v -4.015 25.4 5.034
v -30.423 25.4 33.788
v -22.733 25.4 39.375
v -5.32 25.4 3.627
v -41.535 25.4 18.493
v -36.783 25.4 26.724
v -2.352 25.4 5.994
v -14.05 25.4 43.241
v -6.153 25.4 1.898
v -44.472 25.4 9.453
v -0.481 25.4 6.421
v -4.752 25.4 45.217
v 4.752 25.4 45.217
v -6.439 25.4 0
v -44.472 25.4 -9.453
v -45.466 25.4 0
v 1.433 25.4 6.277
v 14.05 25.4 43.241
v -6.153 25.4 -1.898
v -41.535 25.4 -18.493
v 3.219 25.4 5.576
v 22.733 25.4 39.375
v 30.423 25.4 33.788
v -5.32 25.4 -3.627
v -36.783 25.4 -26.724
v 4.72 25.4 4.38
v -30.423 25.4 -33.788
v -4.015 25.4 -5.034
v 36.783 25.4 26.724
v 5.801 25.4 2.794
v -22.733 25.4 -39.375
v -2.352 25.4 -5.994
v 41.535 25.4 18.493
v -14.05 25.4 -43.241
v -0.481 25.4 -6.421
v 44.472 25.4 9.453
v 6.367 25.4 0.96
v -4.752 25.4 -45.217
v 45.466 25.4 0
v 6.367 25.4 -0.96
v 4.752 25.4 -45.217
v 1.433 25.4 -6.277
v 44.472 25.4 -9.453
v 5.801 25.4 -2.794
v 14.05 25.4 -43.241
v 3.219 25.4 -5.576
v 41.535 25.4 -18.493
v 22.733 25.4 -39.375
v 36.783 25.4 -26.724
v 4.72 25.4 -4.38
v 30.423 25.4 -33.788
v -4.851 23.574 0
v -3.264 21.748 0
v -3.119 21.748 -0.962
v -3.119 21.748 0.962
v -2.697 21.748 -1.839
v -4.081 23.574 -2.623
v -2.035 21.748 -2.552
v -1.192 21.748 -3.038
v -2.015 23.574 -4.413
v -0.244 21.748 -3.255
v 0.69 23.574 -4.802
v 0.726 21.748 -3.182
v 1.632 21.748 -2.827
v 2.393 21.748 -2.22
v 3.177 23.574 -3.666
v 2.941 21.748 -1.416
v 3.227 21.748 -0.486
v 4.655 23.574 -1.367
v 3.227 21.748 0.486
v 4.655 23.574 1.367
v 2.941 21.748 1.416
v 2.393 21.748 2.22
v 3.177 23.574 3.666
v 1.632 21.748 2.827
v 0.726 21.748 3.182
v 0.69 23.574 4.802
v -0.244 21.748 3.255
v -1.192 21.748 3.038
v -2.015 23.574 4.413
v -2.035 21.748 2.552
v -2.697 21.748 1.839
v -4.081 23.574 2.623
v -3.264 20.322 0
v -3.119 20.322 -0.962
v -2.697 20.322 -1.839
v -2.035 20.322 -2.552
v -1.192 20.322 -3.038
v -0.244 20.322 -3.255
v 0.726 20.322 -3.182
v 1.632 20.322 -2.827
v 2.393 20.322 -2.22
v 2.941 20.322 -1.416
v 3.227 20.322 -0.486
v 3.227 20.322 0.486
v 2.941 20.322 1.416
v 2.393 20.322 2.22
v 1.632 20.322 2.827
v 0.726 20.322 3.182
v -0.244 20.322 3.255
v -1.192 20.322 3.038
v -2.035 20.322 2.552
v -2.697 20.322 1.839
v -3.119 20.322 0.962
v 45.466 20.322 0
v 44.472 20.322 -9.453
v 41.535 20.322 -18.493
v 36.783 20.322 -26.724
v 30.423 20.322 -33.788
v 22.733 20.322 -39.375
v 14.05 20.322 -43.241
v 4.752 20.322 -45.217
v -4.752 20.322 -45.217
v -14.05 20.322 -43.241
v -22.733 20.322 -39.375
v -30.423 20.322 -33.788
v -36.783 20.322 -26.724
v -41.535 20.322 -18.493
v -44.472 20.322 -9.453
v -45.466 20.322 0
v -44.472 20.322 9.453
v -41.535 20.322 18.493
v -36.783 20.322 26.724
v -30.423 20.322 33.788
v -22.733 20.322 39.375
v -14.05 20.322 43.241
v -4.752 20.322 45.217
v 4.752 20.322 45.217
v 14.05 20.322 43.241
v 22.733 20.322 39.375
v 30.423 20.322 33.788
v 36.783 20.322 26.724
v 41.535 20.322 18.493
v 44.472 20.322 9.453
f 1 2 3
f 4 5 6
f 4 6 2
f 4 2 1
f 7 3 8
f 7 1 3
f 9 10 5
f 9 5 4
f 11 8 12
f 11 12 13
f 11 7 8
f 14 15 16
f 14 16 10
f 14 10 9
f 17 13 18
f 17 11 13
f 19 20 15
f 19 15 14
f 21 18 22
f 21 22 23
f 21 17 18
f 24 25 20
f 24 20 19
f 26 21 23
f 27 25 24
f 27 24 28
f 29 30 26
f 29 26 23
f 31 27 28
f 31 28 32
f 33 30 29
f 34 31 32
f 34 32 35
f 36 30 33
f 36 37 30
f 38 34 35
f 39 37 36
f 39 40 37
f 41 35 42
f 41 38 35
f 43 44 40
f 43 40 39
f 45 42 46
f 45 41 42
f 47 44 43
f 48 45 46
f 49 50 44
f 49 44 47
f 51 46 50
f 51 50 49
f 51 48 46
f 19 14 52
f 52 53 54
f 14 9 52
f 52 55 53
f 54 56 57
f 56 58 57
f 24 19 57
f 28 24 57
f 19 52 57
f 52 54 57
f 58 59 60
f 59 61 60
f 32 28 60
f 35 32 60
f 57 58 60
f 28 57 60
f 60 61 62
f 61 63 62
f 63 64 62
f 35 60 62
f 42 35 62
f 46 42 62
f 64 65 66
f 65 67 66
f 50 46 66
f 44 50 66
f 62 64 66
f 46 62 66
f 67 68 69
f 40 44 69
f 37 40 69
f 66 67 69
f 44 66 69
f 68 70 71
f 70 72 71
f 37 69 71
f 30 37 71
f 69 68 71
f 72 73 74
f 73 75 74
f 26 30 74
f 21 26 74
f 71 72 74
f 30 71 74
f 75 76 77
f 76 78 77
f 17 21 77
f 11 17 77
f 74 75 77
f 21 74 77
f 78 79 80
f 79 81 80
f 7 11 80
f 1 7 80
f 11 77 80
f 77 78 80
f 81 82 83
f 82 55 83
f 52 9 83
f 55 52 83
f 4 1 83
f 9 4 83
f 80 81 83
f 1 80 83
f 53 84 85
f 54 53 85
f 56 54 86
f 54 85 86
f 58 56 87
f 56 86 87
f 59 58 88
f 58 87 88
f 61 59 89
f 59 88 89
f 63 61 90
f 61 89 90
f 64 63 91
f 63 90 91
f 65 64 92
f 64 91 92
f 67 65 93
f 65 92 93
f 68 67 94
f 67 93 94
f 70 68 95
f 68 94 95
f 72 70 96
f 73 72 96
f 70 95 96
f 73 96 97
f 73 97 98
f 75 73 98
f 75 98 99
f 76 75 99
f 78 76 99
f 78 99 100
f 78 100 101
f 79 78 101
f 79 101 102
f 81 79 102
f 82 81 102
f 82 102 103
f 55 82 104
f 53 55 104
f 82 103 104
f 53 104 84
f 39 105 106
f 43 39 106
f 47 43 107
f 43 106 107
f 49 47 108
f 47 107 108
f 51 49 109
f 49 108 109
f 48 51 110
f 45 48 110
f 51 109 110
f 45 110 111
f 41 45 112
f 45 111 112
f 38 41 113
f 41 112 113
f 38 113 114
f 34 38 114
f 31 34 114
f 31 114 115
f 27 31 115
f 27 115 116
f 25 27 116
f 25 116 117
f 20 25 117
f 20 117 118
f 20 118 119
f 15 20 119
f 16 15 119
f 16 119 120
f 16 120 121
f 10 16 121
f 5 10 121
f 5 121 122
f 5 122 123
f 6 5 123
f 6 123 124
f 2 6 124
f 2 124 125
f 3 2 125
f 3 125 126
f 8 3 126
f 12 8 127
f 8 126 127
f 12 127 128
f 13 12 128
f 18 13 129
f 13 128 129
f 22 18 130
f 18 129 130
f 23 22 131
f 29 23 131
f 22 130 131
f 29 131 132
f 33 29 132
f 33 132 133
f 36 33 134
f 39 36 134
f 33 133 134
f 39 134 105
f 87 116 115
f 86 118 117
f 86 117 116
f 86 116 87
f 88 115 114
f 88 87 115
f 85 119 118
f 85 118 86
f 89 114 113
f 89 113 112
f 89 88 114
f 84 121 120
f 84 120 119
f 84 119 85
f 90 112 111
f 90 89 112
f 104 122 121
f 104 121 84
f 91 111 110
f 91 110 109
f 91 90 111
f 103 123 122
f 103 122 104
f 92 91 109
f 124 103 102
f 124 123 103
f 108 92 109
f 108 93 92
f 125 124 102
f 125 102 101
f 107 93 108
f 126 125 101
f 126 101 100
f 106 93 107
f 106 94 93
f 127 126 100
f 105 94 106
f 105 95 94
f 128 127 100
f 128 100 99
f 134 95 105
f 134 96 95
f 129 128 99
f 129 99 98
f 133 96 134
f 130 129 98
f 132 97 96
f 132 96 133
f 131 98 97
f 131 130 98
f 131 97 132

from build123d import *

# Parameters (mm, degrees)
SKETCH1_R                                        = 45.466
BOSS_EXTRUDE1_DEPTH                              = 25.4
SKETCH3_R                                        = 20.32
CUT_EXTRUDE1_DEPTH                               = 12.7
CSK_FOR_1_4_FLAT_HEAD_MACHINE_SCREW1_D           = 6.5278
CSK_FOR_1_4_FLAT_HEAD_MACHINE_SCREW1_DEPTH       = 25.4
CSK_FOR_1_4_FLAT_HEAD_MACHINE_SCREW1_CSINK_D     = 12.8778
CSK_FOR_1_4_FLAT_HEAD_MACHINE_SCREW1_CSINK_ANGLE = 82
CSK_FOR_1_4_FLAT_HEAD_MACHINE_SCREW1_TIP         = 1.961148974
SKETCH9_R                                        = 53.031918303
CUT_EXTRUDE3_DEPTH                               = 20.322357613


with BuildPart() as part:
    # Sketch1 → Boss-Extrude1 (new body)
    with BuildSketch(Plane(origin=(0, 0, 0), x_dir=(1, 0, 0), z_dir=(0, 1, 0))):
        Circle(SKETCH1_R)
    extrude(amount=BOSS_EXTRUDE1_DEPTH)

    # Sketch3 → Cut-Extrude1 (cut)
    with BuildSketch(Plane.XZ):
        Circle(SKETCH3_R)
    extrude(amount=-CUT_EXTRUDE1_DEPTH, mode=Mode.SUBTRACT)

    # CSK for 1/4 Flat Head Machine Screw1
    with Locations(Plane(origin=(0, 25.4, 0), x_dir=(1, 0, 0), z_dir=(0, 1, 0))):
        with Locations((0, 0)):
            CounterSinkHole(CSK_FOR_1_4_FLAT_HEAD_MACHINE_SCREW1_D / 2, CSK_FOR_1_4_FLAT_HEAD_MACHINE_SCREW1_CSINK_D / 2, depth=CSK_FOR_1_4_FLAT_HEAD_MACHINE_SCREW1_DEPTH, counter_sink_angle=CSK_FOR_1_4_FLAT_HEAD_MACHINE_SCREW1_CSINK_ANGLE)
            with Locations((0, 0, -(CSK_FOR_1_4_FLAT_HEAD_MACHINE_SCREW1_DEPTH + CSK_FOR_1_4_FLAT_HEAD_MACHINE_SCREW1_TIP / 2))):  # 118° drill point
                Cone(0, CSK_FOR_1_4_FLAT_HEAD_MACHINE_SCREW1_D / 2, CSK_FOR_1_4_FLAT_HEAD_MACHINE_SCREW1_TIP, mode=Mode.SUBTRACT)

    # Sketch9 → Cut-Extrude3 (cut)
    with BuildSketch(Plane.XZ):
        Circle(SKETCH9_R)
    extrude(amount=-CUT_EXTRUDE3_DEPTH, mode=Mode.SUBTRACT)


solid = part.part
